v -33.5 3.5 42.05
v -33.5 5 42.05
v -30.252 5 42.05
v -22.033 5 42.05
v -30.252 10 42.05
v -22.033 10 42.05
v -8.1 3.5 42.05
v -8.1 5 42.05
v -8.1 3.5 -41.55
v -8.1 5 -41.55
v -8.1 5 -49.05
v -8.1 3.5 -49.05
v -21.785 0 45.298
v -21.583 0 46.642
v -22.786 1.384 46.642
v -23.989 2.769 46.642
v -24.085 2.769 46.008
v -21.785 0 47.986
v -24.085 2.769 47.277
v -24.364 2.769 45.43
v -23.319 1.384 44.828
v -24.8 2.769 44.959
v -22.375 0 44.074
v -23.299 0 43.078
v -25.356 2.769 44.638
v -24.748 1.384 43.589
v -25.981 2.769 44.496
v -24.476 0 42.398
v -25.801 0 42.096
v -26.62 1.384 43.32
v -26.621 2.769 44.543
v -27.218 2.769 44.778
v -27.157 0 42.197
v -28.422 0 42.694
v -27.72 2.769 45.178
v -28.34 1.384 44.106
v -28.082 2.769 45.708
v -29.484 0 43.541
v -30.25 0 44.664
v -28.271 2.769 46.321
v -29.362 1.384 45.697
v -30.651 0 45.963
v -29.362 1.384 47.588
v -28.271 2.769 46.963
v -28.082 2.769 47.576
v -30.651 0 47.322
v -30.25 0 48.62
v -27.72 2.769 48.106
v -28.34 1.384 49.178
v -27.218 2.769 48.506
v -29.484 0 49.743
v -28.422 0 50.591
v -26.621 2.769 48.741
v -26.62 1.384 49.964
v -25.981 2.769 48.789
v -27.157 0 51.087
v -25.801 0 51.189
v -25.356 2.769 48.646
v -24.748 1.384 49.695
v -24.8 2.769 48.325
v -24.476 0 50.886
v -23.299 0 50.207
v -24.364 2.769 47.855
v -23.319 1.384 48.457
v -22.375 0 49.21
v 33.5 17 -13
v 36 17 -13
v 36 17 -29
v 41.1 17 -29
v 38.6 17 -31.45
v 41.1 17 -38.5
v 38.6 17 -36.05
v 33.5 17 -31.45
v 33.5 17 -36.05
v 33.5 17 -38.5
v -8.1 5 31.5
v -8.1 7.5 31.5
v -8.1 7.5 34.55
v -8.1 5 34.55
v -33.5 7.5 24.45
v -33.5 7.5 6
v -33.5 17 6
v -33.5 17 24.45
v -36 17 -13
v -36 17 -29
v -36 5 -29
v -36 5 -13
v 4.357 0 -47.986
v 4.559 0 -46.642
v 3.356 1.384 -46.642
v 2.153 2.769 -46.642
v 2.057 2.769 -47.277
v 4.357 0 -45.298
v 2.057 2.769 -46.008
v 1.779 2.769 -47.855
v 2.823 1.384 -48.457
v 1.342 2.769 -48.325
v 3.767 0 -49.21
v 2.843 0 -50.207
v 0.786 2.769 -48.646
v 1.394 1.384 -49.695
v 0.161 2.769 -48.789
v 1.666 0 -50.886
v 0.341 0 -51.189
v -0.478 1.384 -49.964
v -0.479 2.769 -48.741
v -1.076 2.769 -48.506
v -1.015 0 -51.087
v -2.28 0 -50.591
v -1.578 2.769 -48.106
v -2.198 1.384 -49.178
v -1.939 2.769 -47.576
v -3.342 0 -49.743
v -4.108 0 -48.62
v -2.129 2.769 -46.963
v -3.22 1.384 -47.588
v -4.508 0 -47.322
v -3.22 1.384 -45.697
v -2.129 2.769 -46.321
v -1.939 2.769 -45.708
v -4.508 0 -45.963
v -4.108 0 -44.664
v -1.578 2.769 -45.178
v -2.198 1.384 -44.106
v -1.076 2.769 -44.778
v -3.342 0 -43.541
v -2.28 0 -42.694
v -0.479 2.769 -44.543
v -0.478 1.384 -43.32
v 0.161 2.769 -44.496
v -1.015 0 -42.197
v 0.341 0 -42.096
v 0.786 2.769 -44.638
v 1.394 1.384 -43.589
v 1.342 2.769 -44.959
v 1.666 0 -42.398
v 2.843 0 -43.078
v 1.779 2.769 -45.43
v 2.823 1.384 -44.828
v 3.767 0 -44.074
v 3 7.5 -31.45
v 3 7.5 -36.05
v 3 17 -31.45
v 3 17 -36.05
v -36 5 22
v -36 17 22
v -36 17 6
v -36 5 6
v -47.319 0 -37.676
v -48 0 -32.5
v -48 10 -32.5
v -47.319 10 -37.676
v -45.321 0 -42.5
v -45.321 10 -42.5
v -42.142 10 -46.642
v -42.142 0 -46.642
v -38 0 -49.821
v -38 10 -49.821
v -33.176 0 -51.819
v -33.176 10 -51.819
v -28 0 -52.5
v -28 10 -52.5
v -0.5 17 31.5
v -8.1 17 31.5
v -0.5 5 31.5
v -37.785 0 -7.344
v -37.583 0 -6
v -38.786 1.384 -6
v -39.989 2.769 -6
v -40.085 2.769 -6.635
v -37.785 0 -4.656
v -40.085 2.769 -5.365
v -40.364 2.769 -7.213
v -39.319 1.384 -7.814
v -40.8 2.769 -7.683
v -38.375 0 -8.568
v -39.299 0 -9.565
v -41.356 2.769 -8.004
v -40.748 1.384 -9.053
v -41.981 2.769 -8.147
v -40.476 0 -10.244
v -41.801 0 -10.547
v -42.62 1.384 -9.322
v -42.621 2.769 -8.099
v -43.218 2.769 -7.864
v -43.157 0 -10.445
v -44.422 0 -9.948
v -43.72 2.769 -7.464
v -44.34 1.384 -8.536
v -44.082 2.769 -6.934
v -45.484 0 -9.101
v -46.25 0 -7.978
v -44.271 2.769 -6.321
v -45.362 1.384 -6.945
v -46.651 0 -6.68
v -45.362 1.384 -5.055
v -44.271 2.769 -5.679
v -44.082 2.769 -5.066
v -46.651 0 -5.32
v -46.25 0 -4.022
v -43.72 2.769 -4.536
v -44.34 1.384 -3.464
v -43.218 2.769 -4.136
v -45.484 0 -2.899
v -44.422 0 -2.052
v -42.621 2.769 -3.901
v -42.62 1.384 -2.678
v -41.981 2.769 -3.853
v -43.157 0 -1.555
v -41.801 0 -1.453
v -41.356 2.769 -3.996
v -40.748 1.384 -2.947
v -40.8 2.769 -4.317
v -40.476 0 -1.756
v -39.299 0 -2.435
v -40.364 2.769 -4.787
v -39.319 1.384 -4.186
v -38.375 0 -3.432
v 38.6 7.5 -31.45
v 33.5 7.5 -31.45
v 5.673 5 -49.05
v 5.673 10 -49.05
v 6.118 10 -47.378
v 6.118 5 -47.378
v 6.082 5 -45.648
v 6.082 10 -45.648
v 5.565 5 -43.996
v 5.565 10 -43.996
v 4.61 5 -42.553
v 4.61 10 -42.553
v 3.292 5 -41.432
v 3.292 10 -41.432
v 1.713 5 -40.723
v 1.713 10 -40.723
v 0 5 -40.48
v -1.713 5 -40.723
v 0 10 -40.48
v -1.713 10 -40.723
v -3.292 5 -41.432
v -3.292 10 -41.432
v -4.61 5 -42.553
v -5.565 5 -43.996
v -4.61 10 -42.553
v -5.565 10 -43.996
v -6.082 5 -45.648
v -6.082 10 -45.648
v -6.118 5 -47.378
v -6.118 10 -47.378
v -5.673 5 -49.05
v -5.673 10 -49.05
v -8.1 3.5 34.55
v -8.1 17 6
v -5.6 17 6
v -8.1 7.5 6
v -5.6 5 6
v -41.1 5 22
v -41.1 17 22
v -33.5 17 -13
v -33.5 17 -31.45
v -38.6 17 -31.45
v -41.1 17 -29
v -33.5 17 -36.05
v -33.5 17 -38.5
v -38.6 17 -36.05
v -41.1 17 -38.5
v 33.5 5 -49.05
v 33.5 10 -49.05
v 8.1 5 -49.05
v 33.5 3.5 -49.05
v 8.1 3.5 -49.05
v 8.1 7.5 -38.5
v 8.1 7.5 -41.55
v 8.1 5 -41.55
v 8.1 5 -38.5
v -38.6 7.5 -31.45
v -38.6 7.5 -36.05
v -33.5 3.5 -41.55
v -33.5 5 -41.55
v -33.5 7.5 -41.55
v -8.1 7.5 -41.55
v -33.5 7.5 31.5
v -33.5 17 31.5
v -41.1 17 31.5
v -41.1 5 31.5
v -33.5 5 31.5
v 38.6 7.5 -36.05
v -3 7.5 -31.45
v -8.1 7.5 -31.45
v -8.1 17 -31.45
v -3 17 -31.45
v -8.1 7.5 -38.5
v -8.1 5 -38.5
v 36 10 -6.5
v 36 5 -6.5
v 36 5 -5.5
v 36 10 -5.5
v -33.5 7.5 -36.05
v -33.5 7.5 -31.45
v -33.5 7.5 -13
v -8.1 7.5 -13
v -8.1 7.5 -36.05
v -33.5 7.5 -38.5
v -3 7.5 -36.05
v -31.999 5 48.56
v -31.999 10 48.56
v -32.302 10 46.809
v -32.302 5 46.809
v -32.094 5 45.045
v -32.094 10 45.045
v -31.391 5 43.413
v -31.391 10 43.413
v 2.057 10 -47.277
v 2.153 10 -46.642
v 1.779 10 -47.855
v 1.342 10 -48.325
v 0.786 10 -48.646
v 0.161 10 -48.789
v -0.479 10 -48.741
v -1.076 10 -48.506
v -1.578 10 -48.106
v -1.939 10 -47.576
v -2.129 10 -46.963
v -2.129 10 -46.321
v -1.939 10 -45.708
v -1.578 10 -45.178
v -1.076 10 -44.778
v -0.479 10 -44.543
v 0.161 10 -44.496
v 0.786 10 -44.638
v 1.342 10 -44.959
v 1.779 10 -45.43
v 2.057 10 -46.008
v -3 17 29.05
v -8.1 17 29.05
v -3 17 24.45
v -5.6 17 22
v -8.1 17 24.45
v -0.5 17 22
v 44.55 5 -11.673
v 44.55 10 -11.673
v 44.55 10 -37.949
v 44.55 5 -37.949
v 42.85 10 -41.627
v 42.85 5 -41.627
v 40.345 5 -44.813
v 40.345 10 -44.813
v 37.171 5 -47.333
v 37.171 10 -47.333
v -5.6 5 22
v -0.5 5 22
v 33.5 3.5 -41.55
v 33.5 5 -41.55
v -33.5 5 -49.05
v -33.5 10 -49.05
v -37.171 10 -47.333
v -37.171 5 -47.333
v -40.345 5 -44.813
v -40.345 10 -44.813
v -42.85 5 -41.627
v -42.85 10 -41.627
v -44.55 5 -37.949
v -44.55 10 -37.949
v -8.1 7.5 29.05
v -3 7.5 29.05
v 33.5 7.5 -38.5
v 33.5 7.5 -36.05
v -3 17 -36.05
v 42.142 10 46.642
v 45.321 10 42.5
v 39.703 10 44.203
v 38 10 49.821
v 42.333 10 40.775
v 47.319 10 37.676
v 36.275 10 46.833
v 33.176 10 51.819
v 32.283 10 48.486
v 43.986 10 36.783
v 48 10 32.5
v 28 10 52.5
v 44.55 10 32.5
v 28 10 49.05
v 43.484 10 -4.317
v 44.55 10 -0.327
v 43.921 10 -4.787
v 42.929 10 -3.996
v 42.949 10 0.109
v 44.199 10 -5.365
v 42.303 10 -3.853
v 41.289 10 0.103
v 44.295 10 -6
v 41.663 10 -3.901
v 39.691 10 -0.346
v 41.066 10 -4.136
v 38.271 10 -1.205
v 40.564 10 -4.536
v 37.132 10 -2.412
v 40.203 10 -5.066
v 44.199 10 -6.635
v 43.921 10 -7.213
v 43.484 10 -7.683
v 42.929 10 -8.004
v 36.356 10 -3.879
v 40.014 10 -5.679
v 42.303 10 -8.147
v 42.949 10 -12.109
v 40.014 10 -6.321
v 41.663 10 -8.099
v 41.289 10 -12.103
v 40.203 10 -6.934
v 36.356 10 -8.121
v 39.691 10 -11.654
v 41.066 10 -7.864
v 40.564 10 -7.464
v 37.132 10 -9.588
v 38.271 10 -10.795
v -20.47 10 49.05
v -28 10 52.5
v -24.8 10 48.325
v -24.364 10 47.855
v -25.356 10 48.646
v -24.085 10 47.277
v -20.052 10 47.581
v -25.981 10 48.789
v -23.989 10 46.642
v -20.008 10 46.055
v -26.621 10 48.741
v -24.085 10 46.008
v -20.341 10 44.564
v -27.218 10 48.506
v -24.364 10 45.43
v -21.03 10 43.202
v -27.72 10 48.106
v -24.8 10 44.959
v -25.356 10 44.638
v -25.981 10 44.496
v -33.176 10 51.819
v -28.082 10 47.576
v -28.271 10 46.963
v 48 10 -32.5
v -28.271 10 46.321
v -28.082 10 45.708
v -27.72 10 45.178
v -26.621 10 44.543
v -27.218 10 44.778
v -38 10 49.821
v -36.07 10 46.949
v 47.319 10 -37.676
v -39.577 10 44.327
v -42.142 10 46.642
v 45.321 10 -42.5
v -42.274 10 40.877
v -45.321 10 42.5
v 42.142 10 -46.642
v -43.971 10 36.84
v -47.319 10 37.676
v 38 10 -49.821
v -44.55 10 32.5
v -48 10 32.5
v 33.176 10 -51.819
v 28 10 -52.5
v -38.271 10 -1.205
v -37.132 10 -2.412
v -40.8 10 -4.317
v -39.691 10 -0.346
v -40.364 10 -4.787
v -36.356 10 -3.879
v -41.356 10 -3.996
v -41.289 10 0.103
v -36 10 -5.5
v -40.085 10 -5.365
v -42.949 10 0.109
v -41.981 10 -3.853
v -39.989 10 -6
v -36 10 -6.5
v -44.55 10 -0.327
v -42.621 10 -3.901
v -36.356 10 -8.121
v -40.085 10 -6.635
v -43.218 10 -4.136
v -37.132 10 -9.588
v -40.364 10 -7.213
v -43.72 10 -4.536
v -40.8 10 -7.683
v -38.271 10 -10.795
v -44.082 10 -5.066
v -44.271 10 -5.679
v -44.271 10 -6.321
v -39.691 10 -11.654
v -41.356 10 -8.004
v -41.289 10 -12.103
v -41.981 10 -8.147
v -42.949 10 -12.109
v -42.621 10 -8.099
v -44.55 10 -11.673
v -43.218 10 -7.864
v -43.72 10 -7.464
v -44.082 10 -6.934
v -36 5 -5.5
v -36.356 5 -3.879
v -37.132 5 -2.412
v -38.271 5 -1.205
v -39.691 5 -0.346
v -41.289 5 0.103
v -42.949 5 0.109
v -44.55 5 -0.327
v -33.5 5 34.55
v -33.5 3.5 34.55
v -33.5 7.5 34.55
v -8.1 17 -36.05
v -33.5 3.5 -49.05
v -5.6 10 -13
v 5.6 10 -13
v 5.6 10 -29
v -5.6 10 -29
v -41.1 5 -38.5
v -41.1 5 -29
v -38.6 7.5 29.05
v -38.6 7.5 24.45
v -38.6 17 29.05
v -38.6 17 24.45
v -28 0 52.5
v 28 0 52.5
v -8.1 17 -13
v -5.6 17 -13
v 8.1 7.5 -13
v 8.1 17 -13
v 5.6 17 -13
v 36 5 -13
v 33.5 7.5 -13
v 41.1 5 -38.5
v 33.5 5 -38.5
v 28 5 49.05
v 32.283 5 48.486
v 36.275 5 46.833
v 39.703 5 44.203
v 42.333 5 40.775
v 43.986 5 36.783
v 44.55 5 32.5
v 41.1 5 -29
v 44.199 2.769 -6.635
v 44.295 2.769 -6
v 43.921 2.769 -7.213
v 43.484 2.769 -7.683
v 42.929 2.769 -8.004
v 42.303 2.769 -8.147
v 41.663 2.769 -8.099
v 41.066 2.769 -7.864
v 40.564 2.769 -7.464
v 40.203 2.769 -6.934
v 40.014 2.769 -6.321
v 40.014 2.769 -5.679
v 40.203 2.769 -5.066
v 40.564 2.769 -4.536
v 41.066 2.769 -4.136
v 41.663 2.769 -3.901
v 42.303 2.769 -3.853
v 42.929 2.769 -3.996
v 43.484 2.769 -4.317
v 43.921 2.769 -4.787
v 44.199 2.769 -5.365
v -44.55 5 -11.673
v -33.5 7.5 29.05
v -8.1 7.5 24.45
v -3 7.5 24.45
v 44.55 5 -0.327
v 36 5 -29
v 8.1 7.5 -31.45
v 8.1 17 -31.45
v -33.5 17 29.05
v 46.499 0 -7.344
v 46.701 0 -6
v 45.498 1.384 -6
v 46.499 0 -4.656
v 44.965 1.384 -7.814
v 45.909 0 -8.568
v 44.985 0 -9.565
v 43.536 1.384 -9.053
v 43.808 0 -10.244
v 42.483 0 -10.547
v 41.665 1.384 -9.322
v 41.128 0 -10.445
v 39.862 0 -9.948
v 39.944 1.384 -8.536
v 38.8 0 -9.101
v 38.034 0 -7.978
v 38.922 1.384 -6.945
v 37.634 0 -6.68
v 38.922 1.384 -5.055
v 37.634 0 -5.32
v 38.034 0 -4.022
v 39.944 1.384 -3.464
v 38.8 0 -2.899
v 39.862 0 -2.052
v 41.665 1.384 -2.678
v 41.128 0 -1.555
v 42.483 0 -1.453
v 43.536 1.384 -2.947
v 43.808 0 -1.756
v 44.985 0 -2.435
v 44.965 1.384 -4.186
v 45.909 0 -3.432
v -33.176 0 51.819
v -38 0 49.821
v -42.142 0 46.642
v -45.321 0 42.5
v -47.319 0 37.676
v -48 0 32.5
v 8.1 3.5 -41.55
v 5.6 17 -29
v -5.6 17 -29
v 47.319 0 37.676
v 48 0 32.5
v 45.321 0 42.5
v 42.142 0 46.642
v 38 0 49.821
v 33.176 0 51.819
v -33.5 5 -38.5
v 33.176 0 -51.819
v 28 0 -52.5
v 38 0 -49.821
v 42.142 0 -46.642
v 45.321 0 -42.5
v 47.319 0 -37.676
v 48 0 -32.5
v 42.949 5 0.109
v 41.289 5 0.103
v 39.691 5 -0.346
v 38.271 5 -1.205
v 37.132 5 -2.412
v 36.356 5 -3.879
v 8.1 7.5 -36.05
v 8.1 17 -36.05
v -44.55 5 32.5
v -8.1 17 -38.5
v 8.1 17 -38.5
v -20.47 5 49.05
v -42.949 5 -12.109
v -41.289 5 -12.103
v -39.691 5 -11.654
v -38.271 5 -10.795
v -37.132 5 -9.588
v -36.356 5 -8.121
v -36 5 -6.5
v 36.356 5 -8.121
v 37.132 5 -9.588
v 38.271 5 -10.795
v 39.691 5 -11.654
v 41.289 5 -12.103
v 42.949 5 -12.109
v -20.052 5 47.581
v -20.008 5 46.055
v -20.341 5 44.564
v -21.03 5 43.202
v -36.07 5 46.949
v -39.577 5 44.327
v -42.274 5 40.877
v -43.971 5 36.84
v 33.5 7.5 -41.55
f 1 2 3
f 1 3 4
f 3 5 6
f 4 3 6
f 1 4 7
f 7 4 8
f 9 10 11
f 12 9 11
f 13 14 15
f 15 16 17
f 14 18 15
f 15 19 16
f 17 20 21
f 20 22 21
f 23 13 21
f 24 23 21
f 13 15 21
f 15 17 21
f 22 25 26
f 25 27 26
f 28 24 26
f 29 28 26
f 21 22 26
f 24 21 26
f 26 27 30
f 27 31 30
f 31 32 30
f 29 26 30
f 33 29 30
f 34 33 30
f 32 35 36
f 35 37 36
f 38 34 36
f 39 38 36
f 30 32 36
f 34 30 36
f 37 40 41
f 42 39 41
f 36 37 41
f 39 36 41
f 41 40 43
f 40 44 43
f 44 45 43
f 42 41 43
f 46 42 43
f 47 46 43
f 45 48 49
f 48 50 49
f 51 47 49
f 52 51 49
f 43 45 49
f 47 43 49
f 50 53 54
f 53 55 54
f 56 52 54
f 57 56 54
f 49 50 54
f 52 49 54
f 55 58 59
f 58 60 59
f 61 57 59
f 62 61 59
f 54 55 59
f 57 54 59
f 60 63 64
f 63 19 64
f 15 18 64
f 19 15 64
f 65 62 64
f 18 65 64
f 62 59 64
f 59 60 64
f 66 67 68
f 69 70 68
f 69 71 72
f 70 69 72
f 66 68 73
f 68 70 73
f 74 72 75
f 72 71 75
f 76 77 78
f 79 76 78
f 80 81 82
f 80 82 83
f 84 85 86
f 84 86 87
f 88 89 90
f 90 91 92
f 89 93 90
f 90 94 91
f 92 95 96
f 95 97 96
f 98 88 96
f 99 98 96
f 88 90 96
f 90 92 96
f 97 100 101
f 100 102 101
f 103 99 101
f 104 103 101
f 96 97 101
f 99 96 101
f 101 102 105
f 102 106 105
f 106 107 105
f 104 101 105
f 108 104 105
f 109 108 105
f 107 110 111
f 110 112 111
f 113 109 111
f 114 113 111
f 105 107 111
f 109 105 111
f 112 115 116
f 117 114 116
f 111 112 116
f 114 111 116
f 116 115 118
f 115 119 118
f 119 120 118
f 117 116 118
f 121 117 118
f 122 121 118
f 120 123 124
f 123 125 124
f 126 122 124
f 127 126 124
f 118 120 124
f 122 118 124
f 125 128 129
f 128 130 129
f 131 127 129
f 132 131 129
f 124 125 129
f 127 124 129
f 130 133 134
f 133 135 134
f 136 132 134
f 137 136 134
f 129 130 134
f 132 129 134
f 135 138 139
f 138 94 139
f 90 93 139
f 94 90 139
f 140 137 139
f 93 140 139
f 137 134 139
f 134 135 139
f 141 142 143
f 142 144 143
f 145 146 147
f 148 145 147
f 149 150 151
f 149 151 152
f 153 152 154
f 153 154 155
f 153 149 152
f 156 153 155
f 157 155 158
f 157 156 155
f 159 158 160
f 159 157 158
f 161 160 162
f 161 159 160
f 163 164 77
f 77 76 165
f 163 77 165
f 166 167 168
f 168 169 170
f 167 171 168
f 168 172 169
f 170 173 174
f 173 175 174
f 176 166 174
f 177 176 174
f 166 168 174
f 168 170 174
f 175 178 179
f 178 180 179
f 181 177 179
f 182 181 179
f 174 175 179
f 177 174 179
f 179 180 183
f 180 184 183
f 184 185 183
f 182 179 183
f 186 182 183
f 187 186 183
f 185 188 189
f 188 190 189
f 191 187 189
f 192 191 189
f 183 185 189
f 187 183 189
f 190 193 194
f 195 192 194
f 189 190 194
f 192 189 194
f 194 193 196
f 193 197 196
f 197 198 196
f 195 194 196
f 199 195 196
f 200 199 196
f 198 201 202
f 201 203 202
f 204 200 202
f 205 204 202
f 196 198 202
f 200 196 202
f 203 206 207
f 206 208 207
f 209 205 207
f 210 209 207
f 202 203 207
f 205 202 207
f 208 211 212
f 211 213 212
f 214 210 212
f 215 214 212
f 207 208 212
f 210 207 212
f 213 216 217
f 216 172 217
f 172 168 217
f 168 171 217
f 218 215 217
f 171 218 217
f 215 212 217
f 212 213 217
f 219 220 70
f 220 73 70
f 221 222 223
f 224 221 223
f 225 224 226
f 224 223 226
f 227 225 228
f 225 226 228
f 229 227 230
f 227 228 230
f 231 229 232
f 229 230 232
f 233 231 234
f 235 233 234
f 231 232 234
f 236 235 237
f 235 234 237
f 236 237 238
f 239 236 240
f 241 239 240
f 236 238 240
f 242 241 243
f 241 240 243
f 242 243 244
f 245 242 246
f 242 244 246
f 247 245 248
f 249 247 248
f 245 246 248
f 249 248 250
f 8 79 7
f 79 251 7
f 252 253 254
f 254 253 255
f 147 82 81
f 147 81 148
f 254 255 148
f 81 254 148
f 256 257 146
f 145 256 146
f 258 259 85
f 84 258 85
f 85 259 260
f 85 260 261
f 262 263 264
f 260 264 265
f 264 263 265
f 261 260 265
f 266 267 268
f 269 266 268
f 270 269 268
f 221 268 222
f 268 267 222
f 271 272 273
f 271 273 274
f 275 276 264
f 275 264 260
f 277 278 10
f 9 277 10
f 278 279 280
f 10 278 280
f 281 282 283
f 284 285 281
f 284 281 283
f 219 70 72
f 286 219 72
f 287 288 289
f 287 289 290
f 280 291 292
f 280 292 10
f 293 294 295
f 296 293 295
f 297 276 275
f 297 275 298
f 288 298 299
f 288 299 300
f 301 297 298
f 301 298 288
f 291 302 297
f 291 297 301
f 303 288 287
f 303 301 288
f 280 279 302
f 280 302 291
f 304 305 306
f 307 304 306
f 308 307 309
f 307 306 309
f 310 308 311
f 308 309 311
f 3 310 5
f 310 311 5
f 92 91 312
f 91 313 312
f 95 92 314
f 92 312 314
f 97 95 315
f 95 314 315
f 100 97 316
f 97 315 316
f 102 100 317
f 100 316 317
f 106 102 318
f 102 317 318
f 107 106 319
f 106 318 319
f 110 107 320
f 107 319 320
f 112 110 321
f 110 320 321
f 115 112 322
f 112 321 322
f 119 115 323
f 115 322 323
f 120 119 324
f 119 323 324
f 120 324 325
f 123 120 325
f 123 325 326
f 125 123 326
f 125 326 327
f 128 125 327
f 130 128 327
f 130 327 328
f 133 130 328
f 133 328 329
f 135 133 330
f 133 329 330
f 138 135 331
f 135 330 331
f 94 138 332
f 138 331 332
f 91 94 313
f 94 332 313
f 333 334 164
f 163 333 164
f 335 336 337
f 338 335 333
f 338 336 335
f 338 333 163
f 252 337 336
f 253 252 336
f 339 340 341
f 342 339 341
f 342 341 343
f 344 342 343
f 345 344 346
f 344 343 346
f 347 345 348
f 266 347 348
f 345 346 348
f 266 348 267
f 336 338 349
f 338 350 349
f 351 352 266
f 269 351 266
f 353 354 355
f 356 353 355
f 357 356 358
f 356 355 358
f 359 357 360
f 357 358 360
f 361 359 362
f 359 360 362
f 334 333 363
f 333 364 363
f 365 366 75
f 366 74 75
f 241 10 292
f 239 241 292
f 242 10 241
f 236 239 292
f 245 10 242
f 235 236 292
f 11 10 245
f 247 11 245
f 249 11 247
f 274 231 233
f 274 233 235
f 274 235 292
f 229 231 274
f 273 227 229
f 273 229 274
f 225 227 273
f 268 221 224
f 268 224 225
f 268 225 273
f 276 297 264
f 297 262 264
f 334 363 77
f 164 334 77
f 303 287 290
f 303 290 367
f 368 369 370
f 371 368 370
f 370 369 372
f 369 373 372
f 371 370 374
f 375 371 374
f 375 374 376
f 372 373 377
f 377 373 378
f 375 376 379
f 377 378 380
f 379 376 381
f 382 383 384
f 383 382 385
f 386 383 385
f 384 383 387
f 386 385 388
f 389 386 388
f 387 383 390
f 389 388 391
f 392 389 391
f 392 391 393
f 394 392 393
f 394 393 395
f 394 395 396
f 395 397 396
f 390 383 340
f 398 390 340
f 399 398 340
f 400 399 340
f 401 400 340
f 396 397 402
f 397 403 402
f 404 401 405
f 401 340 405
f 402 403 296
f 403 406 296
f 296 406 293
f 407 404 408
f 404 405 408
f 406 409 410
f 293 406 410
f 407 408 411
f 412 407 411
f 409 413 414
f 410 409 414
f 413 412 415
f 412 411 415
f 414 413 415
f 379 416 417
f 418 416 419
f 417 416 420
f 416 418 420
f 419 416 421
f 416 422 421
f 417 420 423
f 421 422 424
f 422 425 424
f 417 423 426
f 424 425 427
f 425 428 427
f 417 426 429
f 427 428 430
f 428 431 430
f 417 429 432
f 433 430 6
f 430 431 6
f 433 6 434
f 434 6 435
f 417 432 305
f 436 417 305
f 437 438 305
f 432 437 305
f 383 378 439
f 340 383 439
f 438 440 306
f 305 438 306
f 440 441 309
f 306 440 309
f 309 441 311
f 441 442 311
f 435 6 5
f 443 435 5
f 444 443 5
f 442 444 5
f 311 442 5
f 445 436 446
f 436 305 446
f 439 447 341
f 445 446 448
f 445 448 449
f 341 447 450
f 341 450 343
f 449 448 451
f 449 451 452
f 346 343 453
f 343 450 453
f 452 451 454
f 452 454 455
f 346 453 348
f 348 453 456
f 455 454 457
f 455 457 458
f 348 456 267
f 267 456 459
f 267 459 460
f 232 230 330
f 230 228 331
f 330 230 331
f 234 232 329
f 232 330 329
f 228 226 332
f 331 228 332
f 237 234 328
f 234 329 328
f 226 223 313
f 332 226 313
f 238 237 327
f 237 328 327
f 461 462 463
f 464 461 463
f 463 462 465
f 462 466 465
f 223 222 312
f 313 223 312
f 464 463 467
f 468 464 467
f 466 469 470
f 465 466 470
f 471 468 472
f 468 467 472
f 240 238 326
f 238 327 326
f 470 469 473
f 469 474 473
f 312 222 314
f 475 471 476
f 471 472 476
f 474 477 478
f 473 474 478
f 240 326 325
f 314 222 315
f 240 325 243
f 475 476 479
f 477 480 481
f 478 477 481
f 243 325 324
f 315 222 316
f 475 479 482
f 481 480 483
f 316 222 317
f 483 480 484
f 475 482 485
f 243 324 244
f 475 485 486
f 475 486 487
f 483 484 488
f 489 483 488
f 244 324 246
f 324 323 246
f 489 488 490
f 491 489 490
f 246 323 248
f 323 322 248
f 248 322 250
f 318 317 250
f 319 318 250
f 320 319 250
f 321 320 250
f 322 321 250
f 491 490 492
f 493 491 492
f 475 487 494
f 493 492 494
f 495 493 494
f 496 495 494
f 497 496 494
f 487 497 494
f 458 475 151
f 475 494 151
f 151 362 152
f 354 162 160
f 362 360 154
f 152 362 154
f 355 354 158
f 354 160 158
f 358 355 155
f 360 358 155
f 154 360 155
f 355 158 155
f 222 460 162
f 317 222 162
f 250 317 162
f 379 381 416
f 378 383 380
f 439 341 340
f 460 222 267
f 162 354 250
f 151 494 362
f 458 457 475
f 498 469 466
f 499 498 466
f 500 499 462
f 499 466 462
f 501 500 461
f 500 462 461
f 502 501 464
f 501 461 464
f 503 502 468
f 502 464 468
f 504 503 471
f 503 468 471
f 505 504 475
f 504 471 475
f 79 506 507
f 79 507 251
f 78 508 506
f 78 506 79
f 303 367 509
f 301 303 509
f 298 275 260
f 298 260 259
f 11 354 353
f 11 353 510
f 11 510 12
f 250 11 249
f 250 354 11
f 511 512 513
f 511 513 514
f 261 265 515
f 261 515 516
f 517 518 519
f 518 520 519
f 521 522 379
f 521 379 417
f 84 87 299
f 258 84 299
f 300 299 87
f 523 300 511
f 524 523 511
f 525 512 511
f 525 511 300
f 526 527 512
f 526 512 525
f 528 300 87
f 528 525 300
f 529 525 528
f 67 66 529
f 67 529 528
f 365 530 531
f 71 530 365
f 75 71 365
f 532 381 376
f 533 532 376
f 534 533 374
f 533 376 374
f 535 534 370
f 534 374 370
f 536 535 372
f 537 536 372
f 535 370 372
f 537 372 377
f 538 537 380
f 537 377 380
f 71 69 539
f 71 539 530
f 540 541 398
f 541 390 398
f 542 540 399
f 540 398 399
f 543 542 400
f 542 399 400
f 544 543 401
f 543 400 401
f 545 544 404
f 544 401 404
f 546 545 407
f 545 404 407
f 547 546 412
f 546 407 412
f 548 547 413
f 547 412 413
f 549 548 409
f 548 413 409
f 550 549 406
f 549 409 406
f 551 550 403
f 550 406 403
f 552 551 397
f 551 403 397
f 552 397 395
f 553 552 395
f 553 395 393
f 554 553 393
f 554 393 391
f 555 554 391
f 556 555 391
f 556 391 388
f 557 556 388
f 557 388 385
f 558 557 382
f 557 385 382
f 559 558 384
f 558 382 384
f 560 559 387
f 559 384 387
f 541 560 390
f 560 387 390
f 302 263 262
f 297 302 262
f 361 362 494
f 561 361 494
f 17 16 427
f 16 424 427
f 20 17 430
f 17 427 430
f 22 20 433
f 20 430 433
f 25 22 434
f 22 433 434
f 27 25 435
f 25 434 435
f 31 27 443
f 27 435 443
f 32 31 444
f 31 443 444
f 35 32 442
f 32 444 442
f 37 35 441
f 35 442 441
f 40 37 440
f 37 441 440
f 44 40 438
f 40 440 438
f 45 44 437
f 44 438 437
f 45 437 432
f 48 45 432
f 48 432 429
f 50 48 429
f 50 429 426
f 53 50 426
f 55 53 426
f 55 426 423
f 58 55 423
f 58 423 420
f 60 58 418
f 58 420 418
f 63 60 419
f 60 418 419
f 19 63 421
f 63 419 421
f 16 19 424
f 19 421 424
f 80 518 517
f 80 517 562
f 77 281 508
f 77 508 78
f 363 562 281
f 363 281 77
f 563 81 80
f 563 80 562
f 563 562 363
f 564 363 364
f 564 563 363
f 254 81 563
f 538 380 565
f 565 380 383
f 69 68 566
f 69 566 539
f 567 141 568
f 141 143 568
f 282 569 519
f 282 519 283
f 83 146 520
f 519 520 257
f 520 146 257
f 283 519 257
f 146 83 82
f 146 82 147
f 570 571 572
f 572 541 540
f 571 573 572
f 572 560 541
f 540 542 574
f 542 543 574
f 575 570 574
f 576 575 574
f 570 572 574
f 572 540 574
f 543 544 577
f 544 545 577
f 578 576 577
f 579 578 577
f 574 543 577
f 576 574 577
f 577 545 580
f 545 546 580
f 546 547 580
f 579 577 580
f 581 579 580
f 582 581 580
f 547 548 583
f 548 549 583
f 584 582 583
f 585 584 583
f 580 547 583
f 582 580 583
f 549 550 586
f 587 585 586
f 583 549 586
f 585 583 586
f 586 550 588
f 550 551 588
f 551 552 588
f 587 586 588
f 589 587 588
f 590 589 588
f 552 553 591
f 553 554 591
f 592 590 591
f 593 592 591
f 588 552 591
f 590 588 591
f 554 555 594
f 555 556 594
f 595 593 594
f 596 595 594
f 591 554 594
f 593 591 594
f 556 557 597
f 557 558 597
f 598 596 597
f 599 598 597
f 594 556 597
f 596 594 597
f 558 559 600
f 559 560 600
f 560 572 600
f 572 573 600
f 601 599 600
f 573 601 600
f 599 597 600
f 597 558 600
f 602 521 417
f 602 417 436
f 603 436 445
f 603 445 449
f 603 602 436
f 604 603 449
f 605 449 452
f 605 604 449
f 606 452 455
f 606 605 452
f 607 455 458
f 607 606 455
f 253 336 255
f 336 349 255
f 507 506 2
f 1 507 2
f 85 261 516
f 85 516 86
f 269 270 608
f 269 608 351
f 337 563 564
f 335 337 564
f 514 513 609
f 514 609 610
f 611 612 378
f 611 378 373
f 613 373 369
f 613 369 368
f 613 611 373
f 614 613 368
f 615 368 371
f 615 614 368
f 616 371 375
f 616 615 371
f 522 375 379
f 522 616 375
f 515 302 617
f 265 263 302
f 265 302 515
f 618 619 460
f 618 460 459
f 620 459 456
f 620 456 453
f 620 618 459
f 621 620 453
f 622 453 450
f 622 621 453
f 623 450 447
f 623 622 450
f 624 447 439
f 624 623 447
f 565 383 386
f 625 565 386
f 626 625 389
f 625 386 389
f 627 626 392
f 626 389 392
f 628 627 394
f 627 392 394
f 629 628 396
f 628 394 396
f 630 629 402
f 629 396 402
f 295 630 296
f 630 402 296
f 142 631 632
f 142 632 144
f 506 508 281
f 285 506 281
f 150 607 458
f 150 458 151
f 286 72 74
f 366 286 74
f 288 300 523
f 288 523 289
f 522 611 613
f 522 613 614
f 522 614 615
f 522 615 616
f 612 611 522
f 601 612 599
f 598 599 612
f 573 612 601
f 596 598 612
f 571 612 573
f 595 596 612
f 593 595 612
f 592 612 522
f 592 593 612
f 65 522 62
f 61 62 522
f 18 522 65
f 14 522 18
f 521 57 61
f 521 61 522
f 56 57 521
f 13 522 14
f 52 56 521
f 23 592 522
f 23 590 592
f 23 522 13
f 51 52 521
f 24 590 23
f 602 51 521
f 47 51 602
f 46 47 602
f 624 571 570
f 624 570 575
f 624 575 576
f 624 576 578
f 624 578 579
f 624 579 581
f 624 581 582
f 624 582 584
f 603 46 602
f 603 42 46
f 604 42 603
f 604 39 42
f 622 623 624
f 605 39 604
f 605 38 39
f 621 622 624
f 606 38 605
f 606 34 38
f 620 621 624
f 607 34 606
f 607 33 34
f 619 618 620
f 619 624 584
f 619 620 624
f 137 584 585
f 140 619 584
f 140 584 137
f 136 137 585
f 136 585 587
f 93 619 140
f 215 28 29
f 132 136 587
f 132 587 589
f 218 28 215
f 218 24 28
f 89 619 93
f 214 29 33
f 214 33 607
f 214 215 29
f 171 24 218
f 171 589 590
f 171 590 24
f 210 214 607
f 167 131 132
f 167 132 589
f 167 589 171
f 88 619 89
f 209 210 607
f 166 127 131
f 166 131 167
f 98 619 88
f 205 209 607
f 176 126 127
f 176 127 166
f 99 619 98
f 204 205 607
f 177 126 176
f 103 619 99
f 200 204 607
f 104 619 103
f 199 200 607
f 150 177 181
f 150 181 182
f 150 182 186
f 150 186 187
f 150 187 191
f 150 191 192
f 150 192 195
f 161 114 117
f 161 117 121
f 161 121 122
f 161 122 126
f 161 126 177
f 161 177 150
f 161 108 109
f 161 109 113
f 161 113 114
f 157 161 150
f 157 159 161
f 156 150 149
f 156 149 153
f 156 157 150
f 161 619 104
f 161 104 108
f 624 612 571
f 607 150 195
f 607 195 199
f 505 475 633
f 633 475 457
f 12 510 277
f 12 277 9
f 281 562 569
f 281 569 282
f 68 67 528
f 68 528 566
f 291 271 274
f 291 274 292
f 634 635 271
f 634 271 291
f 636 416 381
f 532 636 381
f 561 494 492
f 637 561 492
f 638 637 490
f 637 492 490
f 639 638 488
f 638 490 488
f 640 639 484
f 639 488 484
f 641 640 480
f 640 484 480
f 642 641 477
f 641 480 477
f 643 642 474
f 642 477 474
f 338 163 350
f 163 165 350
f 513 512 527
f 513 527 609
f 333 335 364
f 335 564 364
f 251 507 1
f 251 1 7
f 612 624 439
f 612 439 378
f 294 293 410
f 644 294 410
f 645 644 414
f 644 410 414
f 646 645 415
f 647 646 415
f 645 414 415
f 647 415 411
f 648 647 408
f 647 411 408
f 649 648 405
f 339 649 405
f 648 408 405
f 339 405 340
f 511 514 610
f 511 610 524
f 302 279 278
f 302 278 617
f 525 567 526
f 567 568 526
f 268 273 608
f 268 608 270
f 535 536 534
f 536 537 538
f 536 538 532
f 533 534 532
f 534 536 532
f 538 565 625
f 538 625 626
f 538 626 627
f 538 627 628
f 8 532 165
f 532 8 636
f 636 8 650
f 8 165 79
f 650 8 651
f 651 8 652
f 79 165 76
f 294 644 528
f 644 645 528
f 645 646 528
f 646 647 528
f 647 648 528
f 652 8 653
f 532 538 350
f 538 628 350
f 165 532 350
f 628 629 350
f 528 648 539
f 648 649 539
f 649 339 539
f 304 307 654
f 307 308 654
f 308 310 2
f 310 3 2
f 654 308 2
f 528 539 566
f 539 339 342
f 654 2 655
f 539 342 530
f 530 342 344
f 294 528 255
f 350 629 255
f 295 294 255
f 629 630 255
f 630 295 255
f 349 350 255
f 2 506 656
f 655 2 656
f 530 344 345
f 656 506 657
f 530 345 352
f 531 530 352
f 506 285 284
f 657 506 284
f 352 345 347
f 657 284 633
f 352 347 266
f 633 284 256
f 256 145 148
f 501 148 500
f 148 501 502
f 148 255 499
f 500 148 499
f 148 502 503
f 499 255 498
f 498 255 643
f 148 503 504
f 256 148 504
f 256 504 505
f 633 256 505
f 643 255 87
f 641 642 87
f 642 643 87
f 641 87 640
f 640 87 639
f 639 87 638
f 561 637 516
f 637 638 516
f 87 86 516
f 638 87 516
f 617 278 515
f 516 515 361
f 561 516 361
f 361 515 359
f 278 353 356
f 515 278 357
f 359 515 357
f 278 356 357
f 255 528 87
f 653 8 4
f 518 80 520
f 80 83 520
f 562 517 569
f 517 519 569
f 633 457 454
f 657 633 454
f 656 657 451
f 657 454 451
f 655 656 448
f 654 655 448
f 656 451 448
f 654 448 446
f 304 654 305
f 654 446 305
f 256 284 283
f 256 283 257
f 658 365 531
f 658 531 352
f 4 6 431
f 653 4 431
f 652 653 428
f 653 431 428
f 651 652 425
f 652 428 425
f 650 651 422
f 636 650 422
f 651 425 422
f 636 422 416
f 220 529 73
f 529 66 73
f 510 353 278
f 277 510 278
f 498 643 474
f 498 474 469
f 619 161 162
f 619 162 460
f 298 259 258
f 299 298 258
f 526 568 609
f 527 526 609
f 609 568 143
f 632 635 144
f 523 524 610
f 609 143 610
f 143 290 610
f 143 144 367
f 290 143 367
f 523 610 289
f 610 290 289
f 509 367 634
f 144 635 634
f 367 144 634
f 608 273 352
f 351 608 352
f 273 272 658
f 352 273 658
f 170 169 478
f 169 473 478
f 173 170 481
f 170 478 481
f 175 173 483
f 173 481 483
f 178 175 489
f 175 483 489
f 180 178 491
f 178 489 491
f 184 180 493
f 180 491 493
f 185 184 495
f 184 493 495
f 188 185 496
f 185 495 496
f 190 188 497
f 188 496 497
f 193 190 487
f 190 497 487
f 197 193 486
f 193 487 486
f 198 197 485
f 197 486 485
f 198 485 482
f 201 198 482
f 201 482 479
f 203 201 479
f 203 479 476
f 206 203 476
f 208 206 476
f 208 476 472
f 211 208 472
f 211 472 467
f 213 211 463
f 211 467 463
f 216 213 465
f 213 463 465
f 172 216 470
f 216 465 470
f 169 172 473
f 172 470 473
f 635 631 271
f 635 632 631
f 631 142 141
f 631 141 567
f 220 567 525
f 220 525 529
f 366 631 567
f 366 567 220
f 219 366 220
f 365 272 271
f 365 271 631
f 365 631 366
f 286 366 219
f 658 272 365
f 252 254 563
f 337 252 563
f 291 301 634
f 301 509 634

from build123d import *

# Parameters (mm, degrees)
BASE_DEPTH                                        = 10
HOLE_FOR_ACTUATOR_COVERS_DEPTH                    = 5
SIDE_CLAMPS_DEPTH                                 = 7
SKETCH14_W                                        = 25.4
SKETCH14_H                                        = 7.5
PULLEY_CLEARANCES_DEPTH                           = 6.5
CSK_FOR_8_FLAT_HEAD_SOCKET_CAP_SCREW1_D           = 4.3053
CSK_FOR_8_FLAT_HEAD_SOCKET_CAP_SCREW1_CSINK_D     = 9.1186
CSK_FOR_8_FLAT_HEAD_SOCKET_CAP_SCREW1_CSINK_ANGLE = 82
ACTUATOR_GROOVE_DEPTH                             = 2.5
MATERIAL_CUTAWAY_DEPTH                            = 5


with BuildPart() as part:
    # Sketch1 → base (new body)
    with BuildSketch(Plane(origin=(0, 0, 0), x_dir=(1, 0, 0), z_dir=(0, 1, 0))):
        with BuildLine():
            Line((-28, 52.5), (28, 52.5))
            ThreePointArc((28, 52.5), (42.142135624, 46.642135624), (48, 32.5))
            Line((48, 32.5), (48, -32.5))
            ThreePointArc((48, -32.5), (42.142135624, -46.642135624), (28, -52.5))
            Line((28, -52.5), (-28, -52.5))
            ThreePointArc((-28, -52.5), (-42.142135624, -46.642135624), (-48, -32.5))
            Line((-48, -32.5), (-48, 32.5))
            ThreePointArc((-48, 32.5), (-42.142135624, 46.642135624), (-28, 52.5))
        make_face()
    extrude(amount=BASE_DEPTH)

    # Sketch10 → hole for actuator covers (cut)
    with BuildSketch(Plane(origin=(0, 10, 0), x_dir=(1, 0, 0), z_dir=(0, 1, 0))):
        Polygon((-5.6, 5.5), (-5.6, 13), (-8.6, 13), (-33, 13), (-36, 13), (-36, 5.5), align=None)
        Polygon((33, 13), (36, 13), (36, 5.5), (5.6, 5.5), (5.6, 13), (8.6, 13), align=None)
        Polygon((-5.6, -6), (-8.6, -6), (-33, -6), (-36, -6), (-36, 1.5), (-5.6, 1.5), align=None)
    extrude(amount=-HOLE_FOR_ACTUATOR_COVERS_DEPTH, mode=Mode.SUBTRACT)

    # Sketch13 → side clamps (add)
    with BuildSketch(Plane(origin=(0, 10, 0), x_dir=(1, 0, 0), z_dir=(0, 1, 0))):
        Polygon((-8.1, -24.45), (-3, -24.45), (-3, -29.05), (-8.1, -29.05), (-8.1, -31.5), (-0.5, -31.5), (-0.5, -22), (-5.6, -22), (-5.6, -6), (-8.1, -6), align=None)
        Polygon((-41.1, 29), (-41.1, 38.5), (-33.5, 38.5), (-33.5, 36.05), (-38.6, 36.05), (-38.6, 31.45), (-33.5, 31.45), (-33.5, 13), (-36, 13), (-36, 29), align=None)
        Polygon((-8.1, 13), (-8.1, 31.45), (-3, 31.45), (-3, 36.05), (-8.1, 36.05), (-8.1, 38.5), (8.1, 38.5), (8.1, 36.05), (3, 36.05), (3, 31.45), (8.1, 31.45), (8.1, 13), (5.6, 13), (5.6, 29), (-5.6, 29), (-5.6, 13), align=None)
        Polygon((33.5, 13), (33.5, 31.45), (38.6, 31.45), (38.6, 36.05), (33.5, 36.05), (33.5, 38.5), (41.1, 38.5), (41.1, 29), (36, 29), (36, 13), align=None)
        Polygon((-38.6, -24.45), (-38.6, -29.05), (-33.5, -29.05), (-33.5, -31.5), (-41.1, -31.5), (-41.1, -22), (-36, -22), (-36, -6), (-33.5, -6), (-33.5, -24.45), align=None)
    extrude(amount=SIDE_CLAMPS_DEPTH)

    # Sketch14 → pulley clearances (cut)
    with BuildSketch(Plane(origin=(0, 10, 0), x_dir=(1, 0, 0), z_dir=(0, 1, 0))):
        with Locations((-20.8, -38.3)):
            Rectangle(SKETCH14_W, SKETCH14_H)
        with Locations((-20.8, 45.3)):
            Rectangle(SKETCH14_W, SKETCH14_H)
        with Locations((20.8, 45.3)):
            Rectangle(SKETCH14_W, SKETCH14_H)
    extrude(amount=-PULLEY_CLEARANCES_DEPTH, mode=Mode.SUBTRACT)

    # CSK for #8 Flat Head Socket Cap Screw1 (through all)
    with Locations(Plane(origin=(0, 0, 0), x_dir=(-1, 0, 0), z_dir=(0, -1, 0))):
        with Locations((26.142135624, -46.642135624), (42.142135624, 6), (0, 46.642135624), (-42.142135624, 6)):
            CounterSinkHole(CSK_FOR_8_FLAT_HEAD_SOCKET_CAP_SCREW1_D / 2, CSK_FOR_8_FLAT_HEAD_SOCKET_CAP_SCREW1_CSINK_D / 2, counter_sink_angle=CSK_FOR_8_FLAT_HEAD_SOCKET_CAP_SCREW1_CSINK_ANGLE)

    # Sketch18 → actuator groove (cut)
    with BuildSketch(Plane(origin=(0, 10, 0), x_dir=(1, 0, 0), z_dir=(0, 1, 0))):
        Polygon((-33.5, 31.45), (-33.5, 13), (-8.1, 13), (-8.1, 31.45), (-3, 31.45), (-3, 36.05), (-8.1, 36.05), (-8.1, 41.55), (-33.5, 41.55), (-33.5, 36.05), (-38.6, 36.05), (-38.6, 31.45), align=None)
        Polygon((38.6, 31.45), (38.6, 36.05), (33.5, 36.05), (33.5, 41.55), (8.1, 41.55), (8.1, 36.05), (3, 36.05), (3, 31.45), (8.1, 31.45), (8.1, 13), (33.5, 13), (33.5, 31.45), align=None)
        Polygon((-33.5, -6), (-33.5, -24.45), (-38.6, -24.45), (-38.6, -29.05), (-33.5, -29.05), (-33.5, -34.55), (-8.1, -34.55), (-8.1, -29.05), (-3, -29.05), (-3, -24.45), (-8.1, -24.45), (-8.1, -6), align=None)
    extrude(amount=-ACTUATOR_GROOVE_DEPTH, mode=Mode.SUBTRACT)

    # Sketch20 → material cutaway (cut)
    with BuildSketch(Plane(origin=(0, 10, 0), x_dir=(1, 0, 0), z_dir=(0, 1, 0))):
        with BuildLine():
            Line((-36, -6), (-5.6, -6))
            Line((-5.6, -6), (-5.6, -22))
            Line((-5.6, -22), (-0.5, -22))
            Line((-0.5, -22), (-0.5, -31.5))
            Line((-0.5, -31.5), (-8.1, -31.5))
            Line((-8.1, -31.5), (-8.1, -42.05))
            Line((-8.1, -42.05), (-22.032619784, -42.05))
            ThreePointArc((-22.032619784, -42.05), (-20.127795479, -45.29917522), (-20.469568377, -49.05))
            Line((-20.469568377, -49.05), (28, -49.05))
            ThreePointArc((28, -49.05), (39.702617229, -44.202617229), (44.55, -32.5))
            Line((44.55, -32.5), (44.55, 0.327432754))
            ThreePointArc((44.55, 0.327432754), (38.952298885, 0.727356298), (36, 5.5))
            ThreePointArc((36, 5.5), (38.535011833, 10.996447536), (44.55, 11.672567246))
            Line((44.55, 11.672567246), (44.55, 37.948525732))
            ThreePointArc((44.55, 37.948525732), (40.344819956, 44.812963205), (33.5, 49.05))
            Line((33.5, 49.05), (8.1, 49.05))
            Line((8.1, 49.05), (5.672567246, 49.05))
            ThreePointArc((5.672567246, 49.05), (0, 40.479682377), (-5.672567246, 49.05))
            Line((-5.672567246, 49.05), (-8.1, 49.05))
            Line((-8.1, 49.05), (-33.5, 49.05))
            ThreePointArc((-33.5, 49.05), (-40.344819956, 44.812963205), (-44.55, 37.948525732))
            Line((-44.55, 37.948525732), (-44.55, 11.672567246))
            ThreePointArc((-44.55, 11.672567246), (-35.979682377, 6), (-44.55, 0.327432754))
            Line((-44.55, 0.327432754), (-44.55, -32.5))
            ThreePointArc((-44.55, -32.5), (-41.039944494, -42.691287828), (-31.998658901, -48.559677051))
            ThreePointArc((-31.998658901, -48.559677051), (-32.093980526, -45.044834063), (-30.251651463, -42.05))
            Line((-30.251651463, -42.05), (-33.5, -42.05))
            Line((-33.5, -42.05), (-33.5, -31.5))
            Line((-33.5, -31.5), (-41.1, -31.5))
            Line((-41.1, -31.5), (-41.1, -22))
            Line((-41.1, -22), (-36, -22))
            Line((-36, -22), (-36, -6))
        make_face()
        Polygon((-8.1, 38.5), (-8.1, 41.55), (-33.5, 41.55), (-33.5, 38.5), (-41.1, 38.5), (-41.1, 29), (-36, 29), (-36, 13), (36, 13), (36, 29), (41.1, 29), (41.1, 38.5), (33.5, 38.5), (33.5, 41.55), (8.1, 41.55), (8.1, 38.5), align=None, mode=Mode.SUBTRACT)
    extrude(amount=-MATERIAL_CUTAWAY_DEPTH, mode=Mode.SUBTRACT)


solid = part.part
